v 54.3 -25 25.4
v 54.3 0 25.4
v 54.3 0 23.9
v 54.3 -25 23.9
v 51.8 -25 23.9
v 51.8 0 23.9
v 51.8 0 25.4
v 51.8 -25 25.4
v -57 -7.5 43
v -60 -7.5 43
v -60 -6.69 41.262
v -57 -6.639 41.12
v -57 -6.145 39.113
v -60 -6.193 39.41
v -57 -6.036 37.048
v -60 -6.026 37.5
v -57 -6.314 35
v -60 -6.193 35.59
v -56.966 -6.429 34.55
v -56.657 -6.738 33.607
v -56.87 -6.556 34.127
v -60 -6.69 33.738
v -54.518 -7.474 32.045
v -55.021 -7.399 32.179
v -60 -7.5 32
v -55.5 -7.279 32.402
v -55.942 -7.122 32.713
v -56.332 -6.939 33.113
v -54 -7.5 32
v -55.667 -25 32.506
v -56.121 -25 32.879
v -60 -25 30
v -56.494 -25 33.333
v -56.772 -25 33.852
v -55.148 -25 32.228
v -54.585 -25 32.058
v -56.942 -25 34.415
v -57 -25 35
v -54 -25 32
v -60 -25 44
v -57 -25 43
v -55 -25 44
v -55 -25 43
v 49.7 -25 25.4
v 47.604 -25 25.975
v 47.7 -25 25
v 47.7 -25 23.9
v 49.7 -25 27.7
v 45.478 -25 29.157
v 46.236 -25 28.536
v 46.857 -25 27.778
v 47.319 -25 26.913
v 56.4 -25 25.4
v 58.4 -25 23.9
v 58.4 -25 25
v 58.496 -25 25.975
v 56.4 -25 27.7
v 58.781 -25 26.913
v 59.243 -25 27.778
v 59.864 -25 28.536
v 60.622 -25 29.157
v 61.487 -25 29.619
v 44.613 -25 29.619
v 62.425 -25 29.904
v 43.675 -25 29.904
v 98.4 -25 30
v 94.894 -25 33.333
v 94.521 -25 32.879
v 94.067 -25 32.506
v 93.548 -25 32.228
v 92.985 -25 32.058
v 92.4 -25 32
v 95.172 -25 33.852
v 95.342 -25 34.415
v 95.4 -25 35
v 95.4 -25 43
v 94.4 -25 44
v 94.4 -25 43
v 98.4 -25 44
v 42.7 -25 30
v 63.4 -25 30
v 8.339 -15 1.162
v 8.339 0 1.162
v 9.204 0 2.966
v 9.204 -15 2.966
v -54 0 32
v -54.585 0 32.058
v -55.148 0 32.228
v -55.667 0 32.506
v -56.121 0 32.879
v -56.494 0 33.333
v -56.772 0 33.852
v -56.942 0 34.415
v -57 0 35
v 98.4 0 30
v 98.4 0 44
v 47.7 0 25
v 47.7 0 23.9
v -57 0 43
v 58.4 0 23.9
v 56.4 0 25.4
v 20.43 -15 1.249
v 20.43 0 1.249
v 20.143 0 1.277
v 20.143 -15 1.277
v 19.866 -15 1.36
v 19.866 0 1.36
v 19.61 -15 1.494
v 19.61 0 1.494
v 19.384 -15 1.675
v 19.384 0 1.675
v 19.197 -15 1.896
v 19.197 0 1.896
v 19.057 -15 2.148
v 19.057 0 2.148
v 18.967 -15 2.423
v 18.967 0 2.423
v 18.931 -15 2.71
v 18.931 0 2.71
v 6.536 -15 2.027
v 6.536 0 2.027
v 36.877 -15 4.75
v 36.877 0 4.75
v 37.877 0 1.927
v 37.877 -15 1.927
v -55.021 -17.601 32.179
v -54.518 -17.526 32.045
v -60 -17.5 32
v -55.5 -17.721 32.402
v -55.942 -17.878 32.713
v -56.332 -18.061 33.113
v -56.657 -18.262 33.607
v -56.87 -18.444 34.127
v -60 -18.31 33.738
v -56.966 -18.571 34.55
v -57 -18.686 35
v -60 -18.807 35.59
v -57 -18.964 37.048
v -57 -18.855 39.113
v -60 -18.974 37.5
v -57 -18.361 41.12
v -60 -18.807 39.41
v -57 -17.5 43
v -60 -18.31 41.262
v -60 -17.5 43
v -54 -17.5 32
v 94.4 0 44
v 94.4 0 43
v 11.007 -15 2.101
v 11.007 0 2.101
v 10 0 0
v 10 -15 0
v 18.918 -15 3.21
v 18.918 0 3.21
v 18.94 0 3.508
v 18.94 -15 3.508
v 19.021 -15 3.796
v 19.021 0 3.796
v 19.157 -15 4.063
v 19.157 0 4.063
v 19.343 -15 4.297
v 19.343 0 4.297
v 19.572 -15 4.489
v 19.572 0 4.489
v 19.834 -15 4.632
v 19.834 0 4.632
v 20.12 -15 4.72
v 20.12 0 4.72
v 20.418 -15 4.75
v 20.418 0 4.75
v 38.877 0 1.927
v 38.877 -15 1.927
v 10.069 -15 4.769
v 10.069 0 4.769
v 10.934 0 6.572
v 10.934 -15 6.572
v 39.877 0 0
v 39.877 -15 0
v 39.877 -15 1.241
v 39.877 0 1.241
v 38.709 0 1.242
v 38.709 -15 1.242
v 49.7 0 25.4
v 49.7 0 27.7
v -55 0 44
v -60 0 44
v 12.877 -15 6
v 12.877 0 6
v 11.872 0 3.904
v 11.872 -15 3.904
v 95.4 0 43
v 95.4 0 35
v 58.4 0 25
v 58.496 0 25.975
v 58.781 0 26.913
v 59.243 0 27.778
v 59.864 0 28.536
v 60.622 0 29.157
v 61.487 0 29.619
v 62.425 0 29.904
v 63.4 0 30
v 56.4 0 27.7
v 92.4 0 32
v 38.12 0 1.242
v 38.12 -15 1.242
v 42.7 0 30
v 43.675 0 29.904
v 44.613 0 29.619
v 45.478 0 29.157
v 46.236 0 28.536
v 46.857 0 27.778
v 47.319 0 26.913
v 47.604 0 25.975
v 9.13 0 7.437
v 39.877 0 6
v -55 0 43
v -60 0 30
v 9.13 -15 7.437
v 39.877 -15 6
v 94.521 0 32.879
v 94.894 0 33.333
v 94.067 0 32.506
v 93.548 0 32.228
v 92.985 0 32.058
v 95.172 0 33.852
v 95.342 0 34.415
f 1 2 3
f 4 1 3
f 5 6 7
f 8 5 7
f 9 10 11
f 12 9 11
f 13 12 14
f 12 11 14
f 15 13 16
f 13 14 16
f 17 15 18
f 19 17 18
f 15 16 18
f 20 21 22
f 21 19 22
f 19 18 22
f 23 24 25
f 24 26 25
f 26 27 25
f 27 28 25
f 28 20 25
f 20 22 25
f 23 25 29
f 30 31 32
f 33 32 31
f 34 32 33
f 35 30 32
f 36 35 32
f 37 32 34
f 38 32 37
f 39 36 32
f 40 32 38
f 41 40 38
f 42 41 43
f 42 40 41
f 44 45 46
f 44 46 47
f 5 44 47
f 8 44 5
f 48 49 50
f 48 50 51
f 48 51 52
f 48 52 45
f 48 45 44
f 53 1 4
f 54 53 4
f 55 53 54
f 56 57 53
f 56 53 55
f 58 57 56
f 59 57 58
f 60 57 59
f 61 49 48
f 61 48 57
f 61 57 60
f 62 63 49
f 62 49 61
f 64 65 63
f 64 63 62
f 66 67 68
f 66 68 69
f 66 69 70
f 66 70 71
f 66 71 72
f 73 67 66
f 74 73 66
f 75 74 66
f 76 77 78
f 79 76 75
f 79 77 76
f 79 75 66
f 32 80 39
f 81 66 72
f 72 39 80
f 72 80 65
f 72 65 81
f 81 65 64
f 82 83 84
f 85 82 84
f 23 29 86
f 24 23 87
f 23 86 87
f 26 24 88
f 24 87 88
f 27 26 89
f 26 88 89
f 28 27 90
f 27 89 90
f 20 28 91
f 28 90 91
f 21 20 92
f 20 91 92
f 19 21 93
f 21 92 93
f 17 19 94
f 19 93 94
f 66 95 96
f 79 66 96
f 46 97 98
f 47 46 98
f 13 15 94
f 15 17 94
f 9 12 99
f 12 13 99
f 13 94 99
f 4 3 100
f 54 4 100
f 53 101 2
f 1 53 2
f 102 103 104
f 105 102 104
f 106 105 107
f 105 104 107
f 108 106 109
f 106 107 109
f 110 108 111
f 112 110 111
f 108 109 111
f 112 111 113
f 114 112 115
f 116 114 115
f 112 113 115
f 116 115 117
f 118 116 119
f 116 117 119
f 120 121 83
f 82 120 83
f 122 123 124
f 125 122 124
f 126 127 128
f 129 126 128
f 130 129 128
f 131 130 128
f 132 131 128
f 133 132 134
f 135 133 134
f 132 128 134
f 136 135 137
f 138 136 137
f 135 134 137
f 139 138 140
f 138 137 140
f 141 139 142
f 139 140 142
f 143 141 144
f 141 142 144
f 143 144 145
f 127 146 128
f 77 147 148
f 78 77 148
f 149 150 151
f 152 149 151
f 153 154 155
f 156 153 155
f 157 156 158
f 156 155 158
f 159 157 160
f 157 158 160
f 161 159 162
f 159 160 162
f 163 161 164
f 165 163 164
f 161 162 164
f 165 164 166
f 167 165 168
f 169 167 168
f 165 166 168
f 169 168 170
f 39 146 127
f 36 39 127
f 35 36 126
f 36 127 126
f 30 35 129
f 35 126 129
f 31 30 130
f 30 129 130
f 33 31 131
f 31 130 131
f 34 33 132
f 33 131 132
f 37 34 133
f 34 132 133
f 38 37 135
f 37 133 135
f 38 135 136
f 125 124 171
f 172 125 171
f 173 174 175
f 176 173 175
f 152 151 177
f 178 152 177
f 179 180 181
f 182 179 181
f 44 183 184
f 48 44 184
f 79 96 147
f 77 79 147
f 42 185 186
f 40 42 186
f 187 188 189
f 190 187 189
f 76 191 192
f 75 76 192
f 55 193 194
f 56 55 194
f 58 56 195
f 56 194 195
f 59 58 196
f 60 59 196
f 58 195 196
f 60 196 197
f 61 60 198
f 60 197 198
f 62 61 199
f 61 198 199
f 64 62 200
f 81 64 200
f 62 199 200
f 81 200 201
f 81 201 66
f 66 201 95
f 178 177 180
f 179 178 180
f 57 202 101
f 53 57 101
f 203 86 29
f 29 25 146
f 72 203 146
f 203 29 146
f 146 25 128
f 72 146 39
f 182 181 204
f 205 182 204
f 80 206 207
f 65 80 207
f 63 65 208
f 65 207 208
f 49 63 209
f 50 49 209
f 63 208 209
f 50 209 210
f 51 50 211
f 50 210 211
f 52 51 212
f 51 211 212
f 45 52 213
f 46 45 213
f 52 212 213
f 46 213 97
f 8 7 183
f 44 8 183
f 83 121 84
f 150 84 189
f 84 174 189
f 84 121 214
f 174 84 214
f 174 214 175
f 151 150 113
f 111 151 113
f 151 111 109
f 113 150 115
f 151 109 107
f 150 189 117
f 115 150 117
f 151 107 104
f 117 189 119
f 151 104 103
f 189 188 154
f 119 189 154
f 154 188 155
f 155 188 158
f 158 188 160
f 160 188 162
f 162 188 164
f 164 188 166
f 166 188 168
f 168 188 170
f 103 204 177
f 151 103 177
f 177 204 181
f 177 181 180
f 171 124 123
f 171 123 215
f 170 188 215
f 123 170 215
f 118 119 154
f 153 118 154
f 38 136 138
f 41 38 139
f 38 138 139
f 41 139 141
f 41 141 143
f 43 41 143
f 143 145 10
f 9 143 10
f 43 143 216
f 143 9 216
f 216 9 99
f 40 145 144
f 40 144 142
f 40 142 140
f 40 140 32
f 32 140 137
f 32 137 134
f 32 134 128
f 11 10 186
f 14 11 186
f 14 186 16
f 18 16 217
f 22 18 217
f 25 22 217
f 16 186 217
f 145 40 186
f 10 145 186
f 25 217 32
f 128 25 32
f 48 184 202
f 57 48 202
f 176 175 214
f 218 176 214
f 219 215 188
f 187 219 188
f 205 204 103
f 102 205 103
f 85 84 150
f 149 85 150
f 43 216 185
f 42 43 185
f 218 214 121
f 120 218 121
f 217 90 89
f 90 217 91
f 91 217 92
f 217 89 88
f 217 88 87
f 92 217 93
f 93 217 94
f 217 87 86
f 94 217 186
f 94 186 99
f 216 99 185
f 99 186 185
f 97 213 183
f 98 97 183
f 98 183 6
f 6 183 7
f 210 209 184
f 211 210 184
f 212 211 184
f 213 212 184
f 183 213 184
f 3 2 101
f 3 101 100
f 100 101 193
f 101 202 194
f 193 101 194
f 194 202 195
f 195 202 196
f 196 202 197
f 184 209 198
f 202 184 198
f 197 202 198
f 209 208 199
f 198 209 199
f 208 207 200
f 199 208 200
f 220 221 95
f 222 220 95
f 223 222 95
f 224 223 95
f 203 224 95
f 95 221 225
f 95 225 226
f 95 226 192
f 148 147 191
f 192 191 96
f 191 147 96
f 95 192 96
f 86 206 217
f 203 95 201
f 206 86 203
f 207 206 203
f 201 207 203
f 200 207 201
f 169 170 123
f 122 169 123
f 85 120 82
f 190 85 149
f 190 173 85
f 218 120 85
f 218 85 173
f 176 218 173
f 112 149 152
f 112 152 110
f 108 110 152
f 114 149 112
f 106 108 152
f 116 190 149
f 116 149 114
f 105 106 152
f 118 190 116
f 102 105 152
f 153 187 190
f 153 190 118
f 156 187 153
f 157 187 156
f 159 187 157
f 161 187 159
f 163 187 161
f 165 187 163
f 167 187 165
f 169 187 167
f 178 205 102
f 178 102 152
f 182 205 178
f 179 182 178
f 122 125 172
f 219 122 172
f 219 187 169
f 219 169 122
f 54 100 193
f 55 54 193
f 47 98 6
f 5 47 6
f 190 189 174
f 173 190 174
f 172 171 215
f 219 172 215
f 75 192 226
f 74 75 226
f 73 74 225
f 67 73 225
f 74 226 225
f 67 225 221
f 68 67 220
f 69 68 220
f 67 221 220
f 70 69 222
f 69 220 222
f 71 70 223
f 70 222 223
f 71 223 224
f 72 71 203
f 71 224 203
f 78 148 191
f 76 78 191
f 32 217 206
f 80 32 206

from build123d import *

# Parameters (mm, degrees)
F1_DEPTH = 15
F2_DEPTH = 25
F4_DEPTH = 6


with BuildPart() as f1:
    # F0 (on Front) → F1 (new body)
    with BuildSketch(Plane.XZ):
        with BuildLine():
            Line((11.007484, 2.100922), (10, 0))
            Line((10, 0), (36.969838, 0))
            Line((36.969838, 0), (39.877263, 0))
            Line((39.877263, 0), (39.877263, 1.241399))
            Line((39.877263, 1.241399), (38.709009, 1.241879))
            Line((38.709009, 1.241879), (38.119937, 1.242122))
            Line((38.119937, 1.242122), (20.430198, 1.249399))
            ThreePointArc((20.430198, 1.249399), (19.38408, 1.674995), (18.931342, 2.709656))
            Line((18.931342, 2.709656), (18.918073, 3.210257))
            ThreePointArc((18.918073, 3.210257), (19.342927, 4.296514), (20.417547, 4.75))
            Line((20.417547, 4.75), (36.877263, 4.75))
            Line((36.877263, 4.75), (37.877263, 1.927152))
            Line((37.877263, 1.927152), (38.877263, 1.927152))
            Line((38.877263, 1.927152), (39.877263, 6))
            Line((39.877263, 6), (12.877263, 6))
            Line((12.877263, 6), (11.872278, 3.904289))
            Line((11.872278, 3.904289), (10.068911, 4.769083))
            Line((10.068911, 4.769083), (10.933704, 6.57245))
            Line((10.933704, 6.57245), (9.130337, 7.437243))
            Line((9.130337, 7.437243), (6.535957, 2.027142))
            Line((6.535957, 2.027142), (8.339324, 1.162349))
            Line((8.339324, 1.162349), (9.204117, 2.965716))
            Line((9.204117, 2.965716), (11.007484, 2.100922))
        make_face()
    extrude(amount=F1_DEPTH)


with BuildPart() as f2:
    # F0 (on Front) → F2 (new body)
    with BuildSketch(Plane.XZ):
        with BuildLine():
            Line((-60, 44), (-60, 30))
            Line((-60, 30), (42.7, 30))
            ThreePointArc((42.7, 30), (46.235534, 28.535534), (47.7, 25))
            Line((47.7, 25), (47.7, 23.9))
            Line((47.7, 23.9), (51.8, 23.9))
            Line((51.8, 23.9), (51.8, 25.4))
            Line((51.8, 25.4), (49.7, 25.4))
            Line((49.7, 25.4), (49.7, 27.7))
            Line((49.7, 27.7), (56.4, 27.7))
            Line((56.4, 27.7), (56.4, 25.4))
            Line((56.4, 25.4), (54.3, 25.4))
            Line((54.3, 25.4), (54.3, 23.9))
            Line((54.3, 23.9), (58.4, 23.9))
            Line((58.4, 23.9), (58.4, 25))
            ThreePointArc((58.4, 25), (59.864466, 28.535534), (63.4, 30))
            Line((63.4, 30), (98.4, 30))
            Line((98.4, 30), (98.4, 44))
            Line((98.4, 44), (94.4, 44))
            Line((94.4, 44), (94.4, 43))
            Line((94.4, 43), (95.4, 43))
            Line((95.4, 43), (95.4, 35))
            ThreePointArc((95.4, 35), (94.52132, 32.87868), (92.4, 32))
            Line((92.4, 32), (-54, 32))
            ThreePointArc((-54, 32), (-56.12132, 32.87868), (-57, 35))
            Line((-57, 35), (-57, 43))
            Line((-57, 43), (-55, 43))
            Line((-55, 43), (-55, 44))
            Line((-55, 44), (-60, 44))
        make_face()
    extrude(amount=F2_DEPTH)

    # F3 (on face) → F4 (cut)
    with BuildSketch(Plane(origin=(-60, 0, 0), x_dir=(0, -1, 0), z_dir=(-1, 0, 0))):
        with BuildLine():
            Line((7.5, 32), (17.5, 32))
            ThreePointArc((17.5, 32), (18.973721, 37.5), (17.5, 43))
            Line((17.5, 43), (7.5, 43))
            ThreePointArc((7.5, 43), (6.026279, 37.5), (7.5, 32))
        make_face()
    extrude(amount=-F4_DEPTH, mode=Mode.SUBTRACT)


solid = Compound([f1.part, f2.part])
